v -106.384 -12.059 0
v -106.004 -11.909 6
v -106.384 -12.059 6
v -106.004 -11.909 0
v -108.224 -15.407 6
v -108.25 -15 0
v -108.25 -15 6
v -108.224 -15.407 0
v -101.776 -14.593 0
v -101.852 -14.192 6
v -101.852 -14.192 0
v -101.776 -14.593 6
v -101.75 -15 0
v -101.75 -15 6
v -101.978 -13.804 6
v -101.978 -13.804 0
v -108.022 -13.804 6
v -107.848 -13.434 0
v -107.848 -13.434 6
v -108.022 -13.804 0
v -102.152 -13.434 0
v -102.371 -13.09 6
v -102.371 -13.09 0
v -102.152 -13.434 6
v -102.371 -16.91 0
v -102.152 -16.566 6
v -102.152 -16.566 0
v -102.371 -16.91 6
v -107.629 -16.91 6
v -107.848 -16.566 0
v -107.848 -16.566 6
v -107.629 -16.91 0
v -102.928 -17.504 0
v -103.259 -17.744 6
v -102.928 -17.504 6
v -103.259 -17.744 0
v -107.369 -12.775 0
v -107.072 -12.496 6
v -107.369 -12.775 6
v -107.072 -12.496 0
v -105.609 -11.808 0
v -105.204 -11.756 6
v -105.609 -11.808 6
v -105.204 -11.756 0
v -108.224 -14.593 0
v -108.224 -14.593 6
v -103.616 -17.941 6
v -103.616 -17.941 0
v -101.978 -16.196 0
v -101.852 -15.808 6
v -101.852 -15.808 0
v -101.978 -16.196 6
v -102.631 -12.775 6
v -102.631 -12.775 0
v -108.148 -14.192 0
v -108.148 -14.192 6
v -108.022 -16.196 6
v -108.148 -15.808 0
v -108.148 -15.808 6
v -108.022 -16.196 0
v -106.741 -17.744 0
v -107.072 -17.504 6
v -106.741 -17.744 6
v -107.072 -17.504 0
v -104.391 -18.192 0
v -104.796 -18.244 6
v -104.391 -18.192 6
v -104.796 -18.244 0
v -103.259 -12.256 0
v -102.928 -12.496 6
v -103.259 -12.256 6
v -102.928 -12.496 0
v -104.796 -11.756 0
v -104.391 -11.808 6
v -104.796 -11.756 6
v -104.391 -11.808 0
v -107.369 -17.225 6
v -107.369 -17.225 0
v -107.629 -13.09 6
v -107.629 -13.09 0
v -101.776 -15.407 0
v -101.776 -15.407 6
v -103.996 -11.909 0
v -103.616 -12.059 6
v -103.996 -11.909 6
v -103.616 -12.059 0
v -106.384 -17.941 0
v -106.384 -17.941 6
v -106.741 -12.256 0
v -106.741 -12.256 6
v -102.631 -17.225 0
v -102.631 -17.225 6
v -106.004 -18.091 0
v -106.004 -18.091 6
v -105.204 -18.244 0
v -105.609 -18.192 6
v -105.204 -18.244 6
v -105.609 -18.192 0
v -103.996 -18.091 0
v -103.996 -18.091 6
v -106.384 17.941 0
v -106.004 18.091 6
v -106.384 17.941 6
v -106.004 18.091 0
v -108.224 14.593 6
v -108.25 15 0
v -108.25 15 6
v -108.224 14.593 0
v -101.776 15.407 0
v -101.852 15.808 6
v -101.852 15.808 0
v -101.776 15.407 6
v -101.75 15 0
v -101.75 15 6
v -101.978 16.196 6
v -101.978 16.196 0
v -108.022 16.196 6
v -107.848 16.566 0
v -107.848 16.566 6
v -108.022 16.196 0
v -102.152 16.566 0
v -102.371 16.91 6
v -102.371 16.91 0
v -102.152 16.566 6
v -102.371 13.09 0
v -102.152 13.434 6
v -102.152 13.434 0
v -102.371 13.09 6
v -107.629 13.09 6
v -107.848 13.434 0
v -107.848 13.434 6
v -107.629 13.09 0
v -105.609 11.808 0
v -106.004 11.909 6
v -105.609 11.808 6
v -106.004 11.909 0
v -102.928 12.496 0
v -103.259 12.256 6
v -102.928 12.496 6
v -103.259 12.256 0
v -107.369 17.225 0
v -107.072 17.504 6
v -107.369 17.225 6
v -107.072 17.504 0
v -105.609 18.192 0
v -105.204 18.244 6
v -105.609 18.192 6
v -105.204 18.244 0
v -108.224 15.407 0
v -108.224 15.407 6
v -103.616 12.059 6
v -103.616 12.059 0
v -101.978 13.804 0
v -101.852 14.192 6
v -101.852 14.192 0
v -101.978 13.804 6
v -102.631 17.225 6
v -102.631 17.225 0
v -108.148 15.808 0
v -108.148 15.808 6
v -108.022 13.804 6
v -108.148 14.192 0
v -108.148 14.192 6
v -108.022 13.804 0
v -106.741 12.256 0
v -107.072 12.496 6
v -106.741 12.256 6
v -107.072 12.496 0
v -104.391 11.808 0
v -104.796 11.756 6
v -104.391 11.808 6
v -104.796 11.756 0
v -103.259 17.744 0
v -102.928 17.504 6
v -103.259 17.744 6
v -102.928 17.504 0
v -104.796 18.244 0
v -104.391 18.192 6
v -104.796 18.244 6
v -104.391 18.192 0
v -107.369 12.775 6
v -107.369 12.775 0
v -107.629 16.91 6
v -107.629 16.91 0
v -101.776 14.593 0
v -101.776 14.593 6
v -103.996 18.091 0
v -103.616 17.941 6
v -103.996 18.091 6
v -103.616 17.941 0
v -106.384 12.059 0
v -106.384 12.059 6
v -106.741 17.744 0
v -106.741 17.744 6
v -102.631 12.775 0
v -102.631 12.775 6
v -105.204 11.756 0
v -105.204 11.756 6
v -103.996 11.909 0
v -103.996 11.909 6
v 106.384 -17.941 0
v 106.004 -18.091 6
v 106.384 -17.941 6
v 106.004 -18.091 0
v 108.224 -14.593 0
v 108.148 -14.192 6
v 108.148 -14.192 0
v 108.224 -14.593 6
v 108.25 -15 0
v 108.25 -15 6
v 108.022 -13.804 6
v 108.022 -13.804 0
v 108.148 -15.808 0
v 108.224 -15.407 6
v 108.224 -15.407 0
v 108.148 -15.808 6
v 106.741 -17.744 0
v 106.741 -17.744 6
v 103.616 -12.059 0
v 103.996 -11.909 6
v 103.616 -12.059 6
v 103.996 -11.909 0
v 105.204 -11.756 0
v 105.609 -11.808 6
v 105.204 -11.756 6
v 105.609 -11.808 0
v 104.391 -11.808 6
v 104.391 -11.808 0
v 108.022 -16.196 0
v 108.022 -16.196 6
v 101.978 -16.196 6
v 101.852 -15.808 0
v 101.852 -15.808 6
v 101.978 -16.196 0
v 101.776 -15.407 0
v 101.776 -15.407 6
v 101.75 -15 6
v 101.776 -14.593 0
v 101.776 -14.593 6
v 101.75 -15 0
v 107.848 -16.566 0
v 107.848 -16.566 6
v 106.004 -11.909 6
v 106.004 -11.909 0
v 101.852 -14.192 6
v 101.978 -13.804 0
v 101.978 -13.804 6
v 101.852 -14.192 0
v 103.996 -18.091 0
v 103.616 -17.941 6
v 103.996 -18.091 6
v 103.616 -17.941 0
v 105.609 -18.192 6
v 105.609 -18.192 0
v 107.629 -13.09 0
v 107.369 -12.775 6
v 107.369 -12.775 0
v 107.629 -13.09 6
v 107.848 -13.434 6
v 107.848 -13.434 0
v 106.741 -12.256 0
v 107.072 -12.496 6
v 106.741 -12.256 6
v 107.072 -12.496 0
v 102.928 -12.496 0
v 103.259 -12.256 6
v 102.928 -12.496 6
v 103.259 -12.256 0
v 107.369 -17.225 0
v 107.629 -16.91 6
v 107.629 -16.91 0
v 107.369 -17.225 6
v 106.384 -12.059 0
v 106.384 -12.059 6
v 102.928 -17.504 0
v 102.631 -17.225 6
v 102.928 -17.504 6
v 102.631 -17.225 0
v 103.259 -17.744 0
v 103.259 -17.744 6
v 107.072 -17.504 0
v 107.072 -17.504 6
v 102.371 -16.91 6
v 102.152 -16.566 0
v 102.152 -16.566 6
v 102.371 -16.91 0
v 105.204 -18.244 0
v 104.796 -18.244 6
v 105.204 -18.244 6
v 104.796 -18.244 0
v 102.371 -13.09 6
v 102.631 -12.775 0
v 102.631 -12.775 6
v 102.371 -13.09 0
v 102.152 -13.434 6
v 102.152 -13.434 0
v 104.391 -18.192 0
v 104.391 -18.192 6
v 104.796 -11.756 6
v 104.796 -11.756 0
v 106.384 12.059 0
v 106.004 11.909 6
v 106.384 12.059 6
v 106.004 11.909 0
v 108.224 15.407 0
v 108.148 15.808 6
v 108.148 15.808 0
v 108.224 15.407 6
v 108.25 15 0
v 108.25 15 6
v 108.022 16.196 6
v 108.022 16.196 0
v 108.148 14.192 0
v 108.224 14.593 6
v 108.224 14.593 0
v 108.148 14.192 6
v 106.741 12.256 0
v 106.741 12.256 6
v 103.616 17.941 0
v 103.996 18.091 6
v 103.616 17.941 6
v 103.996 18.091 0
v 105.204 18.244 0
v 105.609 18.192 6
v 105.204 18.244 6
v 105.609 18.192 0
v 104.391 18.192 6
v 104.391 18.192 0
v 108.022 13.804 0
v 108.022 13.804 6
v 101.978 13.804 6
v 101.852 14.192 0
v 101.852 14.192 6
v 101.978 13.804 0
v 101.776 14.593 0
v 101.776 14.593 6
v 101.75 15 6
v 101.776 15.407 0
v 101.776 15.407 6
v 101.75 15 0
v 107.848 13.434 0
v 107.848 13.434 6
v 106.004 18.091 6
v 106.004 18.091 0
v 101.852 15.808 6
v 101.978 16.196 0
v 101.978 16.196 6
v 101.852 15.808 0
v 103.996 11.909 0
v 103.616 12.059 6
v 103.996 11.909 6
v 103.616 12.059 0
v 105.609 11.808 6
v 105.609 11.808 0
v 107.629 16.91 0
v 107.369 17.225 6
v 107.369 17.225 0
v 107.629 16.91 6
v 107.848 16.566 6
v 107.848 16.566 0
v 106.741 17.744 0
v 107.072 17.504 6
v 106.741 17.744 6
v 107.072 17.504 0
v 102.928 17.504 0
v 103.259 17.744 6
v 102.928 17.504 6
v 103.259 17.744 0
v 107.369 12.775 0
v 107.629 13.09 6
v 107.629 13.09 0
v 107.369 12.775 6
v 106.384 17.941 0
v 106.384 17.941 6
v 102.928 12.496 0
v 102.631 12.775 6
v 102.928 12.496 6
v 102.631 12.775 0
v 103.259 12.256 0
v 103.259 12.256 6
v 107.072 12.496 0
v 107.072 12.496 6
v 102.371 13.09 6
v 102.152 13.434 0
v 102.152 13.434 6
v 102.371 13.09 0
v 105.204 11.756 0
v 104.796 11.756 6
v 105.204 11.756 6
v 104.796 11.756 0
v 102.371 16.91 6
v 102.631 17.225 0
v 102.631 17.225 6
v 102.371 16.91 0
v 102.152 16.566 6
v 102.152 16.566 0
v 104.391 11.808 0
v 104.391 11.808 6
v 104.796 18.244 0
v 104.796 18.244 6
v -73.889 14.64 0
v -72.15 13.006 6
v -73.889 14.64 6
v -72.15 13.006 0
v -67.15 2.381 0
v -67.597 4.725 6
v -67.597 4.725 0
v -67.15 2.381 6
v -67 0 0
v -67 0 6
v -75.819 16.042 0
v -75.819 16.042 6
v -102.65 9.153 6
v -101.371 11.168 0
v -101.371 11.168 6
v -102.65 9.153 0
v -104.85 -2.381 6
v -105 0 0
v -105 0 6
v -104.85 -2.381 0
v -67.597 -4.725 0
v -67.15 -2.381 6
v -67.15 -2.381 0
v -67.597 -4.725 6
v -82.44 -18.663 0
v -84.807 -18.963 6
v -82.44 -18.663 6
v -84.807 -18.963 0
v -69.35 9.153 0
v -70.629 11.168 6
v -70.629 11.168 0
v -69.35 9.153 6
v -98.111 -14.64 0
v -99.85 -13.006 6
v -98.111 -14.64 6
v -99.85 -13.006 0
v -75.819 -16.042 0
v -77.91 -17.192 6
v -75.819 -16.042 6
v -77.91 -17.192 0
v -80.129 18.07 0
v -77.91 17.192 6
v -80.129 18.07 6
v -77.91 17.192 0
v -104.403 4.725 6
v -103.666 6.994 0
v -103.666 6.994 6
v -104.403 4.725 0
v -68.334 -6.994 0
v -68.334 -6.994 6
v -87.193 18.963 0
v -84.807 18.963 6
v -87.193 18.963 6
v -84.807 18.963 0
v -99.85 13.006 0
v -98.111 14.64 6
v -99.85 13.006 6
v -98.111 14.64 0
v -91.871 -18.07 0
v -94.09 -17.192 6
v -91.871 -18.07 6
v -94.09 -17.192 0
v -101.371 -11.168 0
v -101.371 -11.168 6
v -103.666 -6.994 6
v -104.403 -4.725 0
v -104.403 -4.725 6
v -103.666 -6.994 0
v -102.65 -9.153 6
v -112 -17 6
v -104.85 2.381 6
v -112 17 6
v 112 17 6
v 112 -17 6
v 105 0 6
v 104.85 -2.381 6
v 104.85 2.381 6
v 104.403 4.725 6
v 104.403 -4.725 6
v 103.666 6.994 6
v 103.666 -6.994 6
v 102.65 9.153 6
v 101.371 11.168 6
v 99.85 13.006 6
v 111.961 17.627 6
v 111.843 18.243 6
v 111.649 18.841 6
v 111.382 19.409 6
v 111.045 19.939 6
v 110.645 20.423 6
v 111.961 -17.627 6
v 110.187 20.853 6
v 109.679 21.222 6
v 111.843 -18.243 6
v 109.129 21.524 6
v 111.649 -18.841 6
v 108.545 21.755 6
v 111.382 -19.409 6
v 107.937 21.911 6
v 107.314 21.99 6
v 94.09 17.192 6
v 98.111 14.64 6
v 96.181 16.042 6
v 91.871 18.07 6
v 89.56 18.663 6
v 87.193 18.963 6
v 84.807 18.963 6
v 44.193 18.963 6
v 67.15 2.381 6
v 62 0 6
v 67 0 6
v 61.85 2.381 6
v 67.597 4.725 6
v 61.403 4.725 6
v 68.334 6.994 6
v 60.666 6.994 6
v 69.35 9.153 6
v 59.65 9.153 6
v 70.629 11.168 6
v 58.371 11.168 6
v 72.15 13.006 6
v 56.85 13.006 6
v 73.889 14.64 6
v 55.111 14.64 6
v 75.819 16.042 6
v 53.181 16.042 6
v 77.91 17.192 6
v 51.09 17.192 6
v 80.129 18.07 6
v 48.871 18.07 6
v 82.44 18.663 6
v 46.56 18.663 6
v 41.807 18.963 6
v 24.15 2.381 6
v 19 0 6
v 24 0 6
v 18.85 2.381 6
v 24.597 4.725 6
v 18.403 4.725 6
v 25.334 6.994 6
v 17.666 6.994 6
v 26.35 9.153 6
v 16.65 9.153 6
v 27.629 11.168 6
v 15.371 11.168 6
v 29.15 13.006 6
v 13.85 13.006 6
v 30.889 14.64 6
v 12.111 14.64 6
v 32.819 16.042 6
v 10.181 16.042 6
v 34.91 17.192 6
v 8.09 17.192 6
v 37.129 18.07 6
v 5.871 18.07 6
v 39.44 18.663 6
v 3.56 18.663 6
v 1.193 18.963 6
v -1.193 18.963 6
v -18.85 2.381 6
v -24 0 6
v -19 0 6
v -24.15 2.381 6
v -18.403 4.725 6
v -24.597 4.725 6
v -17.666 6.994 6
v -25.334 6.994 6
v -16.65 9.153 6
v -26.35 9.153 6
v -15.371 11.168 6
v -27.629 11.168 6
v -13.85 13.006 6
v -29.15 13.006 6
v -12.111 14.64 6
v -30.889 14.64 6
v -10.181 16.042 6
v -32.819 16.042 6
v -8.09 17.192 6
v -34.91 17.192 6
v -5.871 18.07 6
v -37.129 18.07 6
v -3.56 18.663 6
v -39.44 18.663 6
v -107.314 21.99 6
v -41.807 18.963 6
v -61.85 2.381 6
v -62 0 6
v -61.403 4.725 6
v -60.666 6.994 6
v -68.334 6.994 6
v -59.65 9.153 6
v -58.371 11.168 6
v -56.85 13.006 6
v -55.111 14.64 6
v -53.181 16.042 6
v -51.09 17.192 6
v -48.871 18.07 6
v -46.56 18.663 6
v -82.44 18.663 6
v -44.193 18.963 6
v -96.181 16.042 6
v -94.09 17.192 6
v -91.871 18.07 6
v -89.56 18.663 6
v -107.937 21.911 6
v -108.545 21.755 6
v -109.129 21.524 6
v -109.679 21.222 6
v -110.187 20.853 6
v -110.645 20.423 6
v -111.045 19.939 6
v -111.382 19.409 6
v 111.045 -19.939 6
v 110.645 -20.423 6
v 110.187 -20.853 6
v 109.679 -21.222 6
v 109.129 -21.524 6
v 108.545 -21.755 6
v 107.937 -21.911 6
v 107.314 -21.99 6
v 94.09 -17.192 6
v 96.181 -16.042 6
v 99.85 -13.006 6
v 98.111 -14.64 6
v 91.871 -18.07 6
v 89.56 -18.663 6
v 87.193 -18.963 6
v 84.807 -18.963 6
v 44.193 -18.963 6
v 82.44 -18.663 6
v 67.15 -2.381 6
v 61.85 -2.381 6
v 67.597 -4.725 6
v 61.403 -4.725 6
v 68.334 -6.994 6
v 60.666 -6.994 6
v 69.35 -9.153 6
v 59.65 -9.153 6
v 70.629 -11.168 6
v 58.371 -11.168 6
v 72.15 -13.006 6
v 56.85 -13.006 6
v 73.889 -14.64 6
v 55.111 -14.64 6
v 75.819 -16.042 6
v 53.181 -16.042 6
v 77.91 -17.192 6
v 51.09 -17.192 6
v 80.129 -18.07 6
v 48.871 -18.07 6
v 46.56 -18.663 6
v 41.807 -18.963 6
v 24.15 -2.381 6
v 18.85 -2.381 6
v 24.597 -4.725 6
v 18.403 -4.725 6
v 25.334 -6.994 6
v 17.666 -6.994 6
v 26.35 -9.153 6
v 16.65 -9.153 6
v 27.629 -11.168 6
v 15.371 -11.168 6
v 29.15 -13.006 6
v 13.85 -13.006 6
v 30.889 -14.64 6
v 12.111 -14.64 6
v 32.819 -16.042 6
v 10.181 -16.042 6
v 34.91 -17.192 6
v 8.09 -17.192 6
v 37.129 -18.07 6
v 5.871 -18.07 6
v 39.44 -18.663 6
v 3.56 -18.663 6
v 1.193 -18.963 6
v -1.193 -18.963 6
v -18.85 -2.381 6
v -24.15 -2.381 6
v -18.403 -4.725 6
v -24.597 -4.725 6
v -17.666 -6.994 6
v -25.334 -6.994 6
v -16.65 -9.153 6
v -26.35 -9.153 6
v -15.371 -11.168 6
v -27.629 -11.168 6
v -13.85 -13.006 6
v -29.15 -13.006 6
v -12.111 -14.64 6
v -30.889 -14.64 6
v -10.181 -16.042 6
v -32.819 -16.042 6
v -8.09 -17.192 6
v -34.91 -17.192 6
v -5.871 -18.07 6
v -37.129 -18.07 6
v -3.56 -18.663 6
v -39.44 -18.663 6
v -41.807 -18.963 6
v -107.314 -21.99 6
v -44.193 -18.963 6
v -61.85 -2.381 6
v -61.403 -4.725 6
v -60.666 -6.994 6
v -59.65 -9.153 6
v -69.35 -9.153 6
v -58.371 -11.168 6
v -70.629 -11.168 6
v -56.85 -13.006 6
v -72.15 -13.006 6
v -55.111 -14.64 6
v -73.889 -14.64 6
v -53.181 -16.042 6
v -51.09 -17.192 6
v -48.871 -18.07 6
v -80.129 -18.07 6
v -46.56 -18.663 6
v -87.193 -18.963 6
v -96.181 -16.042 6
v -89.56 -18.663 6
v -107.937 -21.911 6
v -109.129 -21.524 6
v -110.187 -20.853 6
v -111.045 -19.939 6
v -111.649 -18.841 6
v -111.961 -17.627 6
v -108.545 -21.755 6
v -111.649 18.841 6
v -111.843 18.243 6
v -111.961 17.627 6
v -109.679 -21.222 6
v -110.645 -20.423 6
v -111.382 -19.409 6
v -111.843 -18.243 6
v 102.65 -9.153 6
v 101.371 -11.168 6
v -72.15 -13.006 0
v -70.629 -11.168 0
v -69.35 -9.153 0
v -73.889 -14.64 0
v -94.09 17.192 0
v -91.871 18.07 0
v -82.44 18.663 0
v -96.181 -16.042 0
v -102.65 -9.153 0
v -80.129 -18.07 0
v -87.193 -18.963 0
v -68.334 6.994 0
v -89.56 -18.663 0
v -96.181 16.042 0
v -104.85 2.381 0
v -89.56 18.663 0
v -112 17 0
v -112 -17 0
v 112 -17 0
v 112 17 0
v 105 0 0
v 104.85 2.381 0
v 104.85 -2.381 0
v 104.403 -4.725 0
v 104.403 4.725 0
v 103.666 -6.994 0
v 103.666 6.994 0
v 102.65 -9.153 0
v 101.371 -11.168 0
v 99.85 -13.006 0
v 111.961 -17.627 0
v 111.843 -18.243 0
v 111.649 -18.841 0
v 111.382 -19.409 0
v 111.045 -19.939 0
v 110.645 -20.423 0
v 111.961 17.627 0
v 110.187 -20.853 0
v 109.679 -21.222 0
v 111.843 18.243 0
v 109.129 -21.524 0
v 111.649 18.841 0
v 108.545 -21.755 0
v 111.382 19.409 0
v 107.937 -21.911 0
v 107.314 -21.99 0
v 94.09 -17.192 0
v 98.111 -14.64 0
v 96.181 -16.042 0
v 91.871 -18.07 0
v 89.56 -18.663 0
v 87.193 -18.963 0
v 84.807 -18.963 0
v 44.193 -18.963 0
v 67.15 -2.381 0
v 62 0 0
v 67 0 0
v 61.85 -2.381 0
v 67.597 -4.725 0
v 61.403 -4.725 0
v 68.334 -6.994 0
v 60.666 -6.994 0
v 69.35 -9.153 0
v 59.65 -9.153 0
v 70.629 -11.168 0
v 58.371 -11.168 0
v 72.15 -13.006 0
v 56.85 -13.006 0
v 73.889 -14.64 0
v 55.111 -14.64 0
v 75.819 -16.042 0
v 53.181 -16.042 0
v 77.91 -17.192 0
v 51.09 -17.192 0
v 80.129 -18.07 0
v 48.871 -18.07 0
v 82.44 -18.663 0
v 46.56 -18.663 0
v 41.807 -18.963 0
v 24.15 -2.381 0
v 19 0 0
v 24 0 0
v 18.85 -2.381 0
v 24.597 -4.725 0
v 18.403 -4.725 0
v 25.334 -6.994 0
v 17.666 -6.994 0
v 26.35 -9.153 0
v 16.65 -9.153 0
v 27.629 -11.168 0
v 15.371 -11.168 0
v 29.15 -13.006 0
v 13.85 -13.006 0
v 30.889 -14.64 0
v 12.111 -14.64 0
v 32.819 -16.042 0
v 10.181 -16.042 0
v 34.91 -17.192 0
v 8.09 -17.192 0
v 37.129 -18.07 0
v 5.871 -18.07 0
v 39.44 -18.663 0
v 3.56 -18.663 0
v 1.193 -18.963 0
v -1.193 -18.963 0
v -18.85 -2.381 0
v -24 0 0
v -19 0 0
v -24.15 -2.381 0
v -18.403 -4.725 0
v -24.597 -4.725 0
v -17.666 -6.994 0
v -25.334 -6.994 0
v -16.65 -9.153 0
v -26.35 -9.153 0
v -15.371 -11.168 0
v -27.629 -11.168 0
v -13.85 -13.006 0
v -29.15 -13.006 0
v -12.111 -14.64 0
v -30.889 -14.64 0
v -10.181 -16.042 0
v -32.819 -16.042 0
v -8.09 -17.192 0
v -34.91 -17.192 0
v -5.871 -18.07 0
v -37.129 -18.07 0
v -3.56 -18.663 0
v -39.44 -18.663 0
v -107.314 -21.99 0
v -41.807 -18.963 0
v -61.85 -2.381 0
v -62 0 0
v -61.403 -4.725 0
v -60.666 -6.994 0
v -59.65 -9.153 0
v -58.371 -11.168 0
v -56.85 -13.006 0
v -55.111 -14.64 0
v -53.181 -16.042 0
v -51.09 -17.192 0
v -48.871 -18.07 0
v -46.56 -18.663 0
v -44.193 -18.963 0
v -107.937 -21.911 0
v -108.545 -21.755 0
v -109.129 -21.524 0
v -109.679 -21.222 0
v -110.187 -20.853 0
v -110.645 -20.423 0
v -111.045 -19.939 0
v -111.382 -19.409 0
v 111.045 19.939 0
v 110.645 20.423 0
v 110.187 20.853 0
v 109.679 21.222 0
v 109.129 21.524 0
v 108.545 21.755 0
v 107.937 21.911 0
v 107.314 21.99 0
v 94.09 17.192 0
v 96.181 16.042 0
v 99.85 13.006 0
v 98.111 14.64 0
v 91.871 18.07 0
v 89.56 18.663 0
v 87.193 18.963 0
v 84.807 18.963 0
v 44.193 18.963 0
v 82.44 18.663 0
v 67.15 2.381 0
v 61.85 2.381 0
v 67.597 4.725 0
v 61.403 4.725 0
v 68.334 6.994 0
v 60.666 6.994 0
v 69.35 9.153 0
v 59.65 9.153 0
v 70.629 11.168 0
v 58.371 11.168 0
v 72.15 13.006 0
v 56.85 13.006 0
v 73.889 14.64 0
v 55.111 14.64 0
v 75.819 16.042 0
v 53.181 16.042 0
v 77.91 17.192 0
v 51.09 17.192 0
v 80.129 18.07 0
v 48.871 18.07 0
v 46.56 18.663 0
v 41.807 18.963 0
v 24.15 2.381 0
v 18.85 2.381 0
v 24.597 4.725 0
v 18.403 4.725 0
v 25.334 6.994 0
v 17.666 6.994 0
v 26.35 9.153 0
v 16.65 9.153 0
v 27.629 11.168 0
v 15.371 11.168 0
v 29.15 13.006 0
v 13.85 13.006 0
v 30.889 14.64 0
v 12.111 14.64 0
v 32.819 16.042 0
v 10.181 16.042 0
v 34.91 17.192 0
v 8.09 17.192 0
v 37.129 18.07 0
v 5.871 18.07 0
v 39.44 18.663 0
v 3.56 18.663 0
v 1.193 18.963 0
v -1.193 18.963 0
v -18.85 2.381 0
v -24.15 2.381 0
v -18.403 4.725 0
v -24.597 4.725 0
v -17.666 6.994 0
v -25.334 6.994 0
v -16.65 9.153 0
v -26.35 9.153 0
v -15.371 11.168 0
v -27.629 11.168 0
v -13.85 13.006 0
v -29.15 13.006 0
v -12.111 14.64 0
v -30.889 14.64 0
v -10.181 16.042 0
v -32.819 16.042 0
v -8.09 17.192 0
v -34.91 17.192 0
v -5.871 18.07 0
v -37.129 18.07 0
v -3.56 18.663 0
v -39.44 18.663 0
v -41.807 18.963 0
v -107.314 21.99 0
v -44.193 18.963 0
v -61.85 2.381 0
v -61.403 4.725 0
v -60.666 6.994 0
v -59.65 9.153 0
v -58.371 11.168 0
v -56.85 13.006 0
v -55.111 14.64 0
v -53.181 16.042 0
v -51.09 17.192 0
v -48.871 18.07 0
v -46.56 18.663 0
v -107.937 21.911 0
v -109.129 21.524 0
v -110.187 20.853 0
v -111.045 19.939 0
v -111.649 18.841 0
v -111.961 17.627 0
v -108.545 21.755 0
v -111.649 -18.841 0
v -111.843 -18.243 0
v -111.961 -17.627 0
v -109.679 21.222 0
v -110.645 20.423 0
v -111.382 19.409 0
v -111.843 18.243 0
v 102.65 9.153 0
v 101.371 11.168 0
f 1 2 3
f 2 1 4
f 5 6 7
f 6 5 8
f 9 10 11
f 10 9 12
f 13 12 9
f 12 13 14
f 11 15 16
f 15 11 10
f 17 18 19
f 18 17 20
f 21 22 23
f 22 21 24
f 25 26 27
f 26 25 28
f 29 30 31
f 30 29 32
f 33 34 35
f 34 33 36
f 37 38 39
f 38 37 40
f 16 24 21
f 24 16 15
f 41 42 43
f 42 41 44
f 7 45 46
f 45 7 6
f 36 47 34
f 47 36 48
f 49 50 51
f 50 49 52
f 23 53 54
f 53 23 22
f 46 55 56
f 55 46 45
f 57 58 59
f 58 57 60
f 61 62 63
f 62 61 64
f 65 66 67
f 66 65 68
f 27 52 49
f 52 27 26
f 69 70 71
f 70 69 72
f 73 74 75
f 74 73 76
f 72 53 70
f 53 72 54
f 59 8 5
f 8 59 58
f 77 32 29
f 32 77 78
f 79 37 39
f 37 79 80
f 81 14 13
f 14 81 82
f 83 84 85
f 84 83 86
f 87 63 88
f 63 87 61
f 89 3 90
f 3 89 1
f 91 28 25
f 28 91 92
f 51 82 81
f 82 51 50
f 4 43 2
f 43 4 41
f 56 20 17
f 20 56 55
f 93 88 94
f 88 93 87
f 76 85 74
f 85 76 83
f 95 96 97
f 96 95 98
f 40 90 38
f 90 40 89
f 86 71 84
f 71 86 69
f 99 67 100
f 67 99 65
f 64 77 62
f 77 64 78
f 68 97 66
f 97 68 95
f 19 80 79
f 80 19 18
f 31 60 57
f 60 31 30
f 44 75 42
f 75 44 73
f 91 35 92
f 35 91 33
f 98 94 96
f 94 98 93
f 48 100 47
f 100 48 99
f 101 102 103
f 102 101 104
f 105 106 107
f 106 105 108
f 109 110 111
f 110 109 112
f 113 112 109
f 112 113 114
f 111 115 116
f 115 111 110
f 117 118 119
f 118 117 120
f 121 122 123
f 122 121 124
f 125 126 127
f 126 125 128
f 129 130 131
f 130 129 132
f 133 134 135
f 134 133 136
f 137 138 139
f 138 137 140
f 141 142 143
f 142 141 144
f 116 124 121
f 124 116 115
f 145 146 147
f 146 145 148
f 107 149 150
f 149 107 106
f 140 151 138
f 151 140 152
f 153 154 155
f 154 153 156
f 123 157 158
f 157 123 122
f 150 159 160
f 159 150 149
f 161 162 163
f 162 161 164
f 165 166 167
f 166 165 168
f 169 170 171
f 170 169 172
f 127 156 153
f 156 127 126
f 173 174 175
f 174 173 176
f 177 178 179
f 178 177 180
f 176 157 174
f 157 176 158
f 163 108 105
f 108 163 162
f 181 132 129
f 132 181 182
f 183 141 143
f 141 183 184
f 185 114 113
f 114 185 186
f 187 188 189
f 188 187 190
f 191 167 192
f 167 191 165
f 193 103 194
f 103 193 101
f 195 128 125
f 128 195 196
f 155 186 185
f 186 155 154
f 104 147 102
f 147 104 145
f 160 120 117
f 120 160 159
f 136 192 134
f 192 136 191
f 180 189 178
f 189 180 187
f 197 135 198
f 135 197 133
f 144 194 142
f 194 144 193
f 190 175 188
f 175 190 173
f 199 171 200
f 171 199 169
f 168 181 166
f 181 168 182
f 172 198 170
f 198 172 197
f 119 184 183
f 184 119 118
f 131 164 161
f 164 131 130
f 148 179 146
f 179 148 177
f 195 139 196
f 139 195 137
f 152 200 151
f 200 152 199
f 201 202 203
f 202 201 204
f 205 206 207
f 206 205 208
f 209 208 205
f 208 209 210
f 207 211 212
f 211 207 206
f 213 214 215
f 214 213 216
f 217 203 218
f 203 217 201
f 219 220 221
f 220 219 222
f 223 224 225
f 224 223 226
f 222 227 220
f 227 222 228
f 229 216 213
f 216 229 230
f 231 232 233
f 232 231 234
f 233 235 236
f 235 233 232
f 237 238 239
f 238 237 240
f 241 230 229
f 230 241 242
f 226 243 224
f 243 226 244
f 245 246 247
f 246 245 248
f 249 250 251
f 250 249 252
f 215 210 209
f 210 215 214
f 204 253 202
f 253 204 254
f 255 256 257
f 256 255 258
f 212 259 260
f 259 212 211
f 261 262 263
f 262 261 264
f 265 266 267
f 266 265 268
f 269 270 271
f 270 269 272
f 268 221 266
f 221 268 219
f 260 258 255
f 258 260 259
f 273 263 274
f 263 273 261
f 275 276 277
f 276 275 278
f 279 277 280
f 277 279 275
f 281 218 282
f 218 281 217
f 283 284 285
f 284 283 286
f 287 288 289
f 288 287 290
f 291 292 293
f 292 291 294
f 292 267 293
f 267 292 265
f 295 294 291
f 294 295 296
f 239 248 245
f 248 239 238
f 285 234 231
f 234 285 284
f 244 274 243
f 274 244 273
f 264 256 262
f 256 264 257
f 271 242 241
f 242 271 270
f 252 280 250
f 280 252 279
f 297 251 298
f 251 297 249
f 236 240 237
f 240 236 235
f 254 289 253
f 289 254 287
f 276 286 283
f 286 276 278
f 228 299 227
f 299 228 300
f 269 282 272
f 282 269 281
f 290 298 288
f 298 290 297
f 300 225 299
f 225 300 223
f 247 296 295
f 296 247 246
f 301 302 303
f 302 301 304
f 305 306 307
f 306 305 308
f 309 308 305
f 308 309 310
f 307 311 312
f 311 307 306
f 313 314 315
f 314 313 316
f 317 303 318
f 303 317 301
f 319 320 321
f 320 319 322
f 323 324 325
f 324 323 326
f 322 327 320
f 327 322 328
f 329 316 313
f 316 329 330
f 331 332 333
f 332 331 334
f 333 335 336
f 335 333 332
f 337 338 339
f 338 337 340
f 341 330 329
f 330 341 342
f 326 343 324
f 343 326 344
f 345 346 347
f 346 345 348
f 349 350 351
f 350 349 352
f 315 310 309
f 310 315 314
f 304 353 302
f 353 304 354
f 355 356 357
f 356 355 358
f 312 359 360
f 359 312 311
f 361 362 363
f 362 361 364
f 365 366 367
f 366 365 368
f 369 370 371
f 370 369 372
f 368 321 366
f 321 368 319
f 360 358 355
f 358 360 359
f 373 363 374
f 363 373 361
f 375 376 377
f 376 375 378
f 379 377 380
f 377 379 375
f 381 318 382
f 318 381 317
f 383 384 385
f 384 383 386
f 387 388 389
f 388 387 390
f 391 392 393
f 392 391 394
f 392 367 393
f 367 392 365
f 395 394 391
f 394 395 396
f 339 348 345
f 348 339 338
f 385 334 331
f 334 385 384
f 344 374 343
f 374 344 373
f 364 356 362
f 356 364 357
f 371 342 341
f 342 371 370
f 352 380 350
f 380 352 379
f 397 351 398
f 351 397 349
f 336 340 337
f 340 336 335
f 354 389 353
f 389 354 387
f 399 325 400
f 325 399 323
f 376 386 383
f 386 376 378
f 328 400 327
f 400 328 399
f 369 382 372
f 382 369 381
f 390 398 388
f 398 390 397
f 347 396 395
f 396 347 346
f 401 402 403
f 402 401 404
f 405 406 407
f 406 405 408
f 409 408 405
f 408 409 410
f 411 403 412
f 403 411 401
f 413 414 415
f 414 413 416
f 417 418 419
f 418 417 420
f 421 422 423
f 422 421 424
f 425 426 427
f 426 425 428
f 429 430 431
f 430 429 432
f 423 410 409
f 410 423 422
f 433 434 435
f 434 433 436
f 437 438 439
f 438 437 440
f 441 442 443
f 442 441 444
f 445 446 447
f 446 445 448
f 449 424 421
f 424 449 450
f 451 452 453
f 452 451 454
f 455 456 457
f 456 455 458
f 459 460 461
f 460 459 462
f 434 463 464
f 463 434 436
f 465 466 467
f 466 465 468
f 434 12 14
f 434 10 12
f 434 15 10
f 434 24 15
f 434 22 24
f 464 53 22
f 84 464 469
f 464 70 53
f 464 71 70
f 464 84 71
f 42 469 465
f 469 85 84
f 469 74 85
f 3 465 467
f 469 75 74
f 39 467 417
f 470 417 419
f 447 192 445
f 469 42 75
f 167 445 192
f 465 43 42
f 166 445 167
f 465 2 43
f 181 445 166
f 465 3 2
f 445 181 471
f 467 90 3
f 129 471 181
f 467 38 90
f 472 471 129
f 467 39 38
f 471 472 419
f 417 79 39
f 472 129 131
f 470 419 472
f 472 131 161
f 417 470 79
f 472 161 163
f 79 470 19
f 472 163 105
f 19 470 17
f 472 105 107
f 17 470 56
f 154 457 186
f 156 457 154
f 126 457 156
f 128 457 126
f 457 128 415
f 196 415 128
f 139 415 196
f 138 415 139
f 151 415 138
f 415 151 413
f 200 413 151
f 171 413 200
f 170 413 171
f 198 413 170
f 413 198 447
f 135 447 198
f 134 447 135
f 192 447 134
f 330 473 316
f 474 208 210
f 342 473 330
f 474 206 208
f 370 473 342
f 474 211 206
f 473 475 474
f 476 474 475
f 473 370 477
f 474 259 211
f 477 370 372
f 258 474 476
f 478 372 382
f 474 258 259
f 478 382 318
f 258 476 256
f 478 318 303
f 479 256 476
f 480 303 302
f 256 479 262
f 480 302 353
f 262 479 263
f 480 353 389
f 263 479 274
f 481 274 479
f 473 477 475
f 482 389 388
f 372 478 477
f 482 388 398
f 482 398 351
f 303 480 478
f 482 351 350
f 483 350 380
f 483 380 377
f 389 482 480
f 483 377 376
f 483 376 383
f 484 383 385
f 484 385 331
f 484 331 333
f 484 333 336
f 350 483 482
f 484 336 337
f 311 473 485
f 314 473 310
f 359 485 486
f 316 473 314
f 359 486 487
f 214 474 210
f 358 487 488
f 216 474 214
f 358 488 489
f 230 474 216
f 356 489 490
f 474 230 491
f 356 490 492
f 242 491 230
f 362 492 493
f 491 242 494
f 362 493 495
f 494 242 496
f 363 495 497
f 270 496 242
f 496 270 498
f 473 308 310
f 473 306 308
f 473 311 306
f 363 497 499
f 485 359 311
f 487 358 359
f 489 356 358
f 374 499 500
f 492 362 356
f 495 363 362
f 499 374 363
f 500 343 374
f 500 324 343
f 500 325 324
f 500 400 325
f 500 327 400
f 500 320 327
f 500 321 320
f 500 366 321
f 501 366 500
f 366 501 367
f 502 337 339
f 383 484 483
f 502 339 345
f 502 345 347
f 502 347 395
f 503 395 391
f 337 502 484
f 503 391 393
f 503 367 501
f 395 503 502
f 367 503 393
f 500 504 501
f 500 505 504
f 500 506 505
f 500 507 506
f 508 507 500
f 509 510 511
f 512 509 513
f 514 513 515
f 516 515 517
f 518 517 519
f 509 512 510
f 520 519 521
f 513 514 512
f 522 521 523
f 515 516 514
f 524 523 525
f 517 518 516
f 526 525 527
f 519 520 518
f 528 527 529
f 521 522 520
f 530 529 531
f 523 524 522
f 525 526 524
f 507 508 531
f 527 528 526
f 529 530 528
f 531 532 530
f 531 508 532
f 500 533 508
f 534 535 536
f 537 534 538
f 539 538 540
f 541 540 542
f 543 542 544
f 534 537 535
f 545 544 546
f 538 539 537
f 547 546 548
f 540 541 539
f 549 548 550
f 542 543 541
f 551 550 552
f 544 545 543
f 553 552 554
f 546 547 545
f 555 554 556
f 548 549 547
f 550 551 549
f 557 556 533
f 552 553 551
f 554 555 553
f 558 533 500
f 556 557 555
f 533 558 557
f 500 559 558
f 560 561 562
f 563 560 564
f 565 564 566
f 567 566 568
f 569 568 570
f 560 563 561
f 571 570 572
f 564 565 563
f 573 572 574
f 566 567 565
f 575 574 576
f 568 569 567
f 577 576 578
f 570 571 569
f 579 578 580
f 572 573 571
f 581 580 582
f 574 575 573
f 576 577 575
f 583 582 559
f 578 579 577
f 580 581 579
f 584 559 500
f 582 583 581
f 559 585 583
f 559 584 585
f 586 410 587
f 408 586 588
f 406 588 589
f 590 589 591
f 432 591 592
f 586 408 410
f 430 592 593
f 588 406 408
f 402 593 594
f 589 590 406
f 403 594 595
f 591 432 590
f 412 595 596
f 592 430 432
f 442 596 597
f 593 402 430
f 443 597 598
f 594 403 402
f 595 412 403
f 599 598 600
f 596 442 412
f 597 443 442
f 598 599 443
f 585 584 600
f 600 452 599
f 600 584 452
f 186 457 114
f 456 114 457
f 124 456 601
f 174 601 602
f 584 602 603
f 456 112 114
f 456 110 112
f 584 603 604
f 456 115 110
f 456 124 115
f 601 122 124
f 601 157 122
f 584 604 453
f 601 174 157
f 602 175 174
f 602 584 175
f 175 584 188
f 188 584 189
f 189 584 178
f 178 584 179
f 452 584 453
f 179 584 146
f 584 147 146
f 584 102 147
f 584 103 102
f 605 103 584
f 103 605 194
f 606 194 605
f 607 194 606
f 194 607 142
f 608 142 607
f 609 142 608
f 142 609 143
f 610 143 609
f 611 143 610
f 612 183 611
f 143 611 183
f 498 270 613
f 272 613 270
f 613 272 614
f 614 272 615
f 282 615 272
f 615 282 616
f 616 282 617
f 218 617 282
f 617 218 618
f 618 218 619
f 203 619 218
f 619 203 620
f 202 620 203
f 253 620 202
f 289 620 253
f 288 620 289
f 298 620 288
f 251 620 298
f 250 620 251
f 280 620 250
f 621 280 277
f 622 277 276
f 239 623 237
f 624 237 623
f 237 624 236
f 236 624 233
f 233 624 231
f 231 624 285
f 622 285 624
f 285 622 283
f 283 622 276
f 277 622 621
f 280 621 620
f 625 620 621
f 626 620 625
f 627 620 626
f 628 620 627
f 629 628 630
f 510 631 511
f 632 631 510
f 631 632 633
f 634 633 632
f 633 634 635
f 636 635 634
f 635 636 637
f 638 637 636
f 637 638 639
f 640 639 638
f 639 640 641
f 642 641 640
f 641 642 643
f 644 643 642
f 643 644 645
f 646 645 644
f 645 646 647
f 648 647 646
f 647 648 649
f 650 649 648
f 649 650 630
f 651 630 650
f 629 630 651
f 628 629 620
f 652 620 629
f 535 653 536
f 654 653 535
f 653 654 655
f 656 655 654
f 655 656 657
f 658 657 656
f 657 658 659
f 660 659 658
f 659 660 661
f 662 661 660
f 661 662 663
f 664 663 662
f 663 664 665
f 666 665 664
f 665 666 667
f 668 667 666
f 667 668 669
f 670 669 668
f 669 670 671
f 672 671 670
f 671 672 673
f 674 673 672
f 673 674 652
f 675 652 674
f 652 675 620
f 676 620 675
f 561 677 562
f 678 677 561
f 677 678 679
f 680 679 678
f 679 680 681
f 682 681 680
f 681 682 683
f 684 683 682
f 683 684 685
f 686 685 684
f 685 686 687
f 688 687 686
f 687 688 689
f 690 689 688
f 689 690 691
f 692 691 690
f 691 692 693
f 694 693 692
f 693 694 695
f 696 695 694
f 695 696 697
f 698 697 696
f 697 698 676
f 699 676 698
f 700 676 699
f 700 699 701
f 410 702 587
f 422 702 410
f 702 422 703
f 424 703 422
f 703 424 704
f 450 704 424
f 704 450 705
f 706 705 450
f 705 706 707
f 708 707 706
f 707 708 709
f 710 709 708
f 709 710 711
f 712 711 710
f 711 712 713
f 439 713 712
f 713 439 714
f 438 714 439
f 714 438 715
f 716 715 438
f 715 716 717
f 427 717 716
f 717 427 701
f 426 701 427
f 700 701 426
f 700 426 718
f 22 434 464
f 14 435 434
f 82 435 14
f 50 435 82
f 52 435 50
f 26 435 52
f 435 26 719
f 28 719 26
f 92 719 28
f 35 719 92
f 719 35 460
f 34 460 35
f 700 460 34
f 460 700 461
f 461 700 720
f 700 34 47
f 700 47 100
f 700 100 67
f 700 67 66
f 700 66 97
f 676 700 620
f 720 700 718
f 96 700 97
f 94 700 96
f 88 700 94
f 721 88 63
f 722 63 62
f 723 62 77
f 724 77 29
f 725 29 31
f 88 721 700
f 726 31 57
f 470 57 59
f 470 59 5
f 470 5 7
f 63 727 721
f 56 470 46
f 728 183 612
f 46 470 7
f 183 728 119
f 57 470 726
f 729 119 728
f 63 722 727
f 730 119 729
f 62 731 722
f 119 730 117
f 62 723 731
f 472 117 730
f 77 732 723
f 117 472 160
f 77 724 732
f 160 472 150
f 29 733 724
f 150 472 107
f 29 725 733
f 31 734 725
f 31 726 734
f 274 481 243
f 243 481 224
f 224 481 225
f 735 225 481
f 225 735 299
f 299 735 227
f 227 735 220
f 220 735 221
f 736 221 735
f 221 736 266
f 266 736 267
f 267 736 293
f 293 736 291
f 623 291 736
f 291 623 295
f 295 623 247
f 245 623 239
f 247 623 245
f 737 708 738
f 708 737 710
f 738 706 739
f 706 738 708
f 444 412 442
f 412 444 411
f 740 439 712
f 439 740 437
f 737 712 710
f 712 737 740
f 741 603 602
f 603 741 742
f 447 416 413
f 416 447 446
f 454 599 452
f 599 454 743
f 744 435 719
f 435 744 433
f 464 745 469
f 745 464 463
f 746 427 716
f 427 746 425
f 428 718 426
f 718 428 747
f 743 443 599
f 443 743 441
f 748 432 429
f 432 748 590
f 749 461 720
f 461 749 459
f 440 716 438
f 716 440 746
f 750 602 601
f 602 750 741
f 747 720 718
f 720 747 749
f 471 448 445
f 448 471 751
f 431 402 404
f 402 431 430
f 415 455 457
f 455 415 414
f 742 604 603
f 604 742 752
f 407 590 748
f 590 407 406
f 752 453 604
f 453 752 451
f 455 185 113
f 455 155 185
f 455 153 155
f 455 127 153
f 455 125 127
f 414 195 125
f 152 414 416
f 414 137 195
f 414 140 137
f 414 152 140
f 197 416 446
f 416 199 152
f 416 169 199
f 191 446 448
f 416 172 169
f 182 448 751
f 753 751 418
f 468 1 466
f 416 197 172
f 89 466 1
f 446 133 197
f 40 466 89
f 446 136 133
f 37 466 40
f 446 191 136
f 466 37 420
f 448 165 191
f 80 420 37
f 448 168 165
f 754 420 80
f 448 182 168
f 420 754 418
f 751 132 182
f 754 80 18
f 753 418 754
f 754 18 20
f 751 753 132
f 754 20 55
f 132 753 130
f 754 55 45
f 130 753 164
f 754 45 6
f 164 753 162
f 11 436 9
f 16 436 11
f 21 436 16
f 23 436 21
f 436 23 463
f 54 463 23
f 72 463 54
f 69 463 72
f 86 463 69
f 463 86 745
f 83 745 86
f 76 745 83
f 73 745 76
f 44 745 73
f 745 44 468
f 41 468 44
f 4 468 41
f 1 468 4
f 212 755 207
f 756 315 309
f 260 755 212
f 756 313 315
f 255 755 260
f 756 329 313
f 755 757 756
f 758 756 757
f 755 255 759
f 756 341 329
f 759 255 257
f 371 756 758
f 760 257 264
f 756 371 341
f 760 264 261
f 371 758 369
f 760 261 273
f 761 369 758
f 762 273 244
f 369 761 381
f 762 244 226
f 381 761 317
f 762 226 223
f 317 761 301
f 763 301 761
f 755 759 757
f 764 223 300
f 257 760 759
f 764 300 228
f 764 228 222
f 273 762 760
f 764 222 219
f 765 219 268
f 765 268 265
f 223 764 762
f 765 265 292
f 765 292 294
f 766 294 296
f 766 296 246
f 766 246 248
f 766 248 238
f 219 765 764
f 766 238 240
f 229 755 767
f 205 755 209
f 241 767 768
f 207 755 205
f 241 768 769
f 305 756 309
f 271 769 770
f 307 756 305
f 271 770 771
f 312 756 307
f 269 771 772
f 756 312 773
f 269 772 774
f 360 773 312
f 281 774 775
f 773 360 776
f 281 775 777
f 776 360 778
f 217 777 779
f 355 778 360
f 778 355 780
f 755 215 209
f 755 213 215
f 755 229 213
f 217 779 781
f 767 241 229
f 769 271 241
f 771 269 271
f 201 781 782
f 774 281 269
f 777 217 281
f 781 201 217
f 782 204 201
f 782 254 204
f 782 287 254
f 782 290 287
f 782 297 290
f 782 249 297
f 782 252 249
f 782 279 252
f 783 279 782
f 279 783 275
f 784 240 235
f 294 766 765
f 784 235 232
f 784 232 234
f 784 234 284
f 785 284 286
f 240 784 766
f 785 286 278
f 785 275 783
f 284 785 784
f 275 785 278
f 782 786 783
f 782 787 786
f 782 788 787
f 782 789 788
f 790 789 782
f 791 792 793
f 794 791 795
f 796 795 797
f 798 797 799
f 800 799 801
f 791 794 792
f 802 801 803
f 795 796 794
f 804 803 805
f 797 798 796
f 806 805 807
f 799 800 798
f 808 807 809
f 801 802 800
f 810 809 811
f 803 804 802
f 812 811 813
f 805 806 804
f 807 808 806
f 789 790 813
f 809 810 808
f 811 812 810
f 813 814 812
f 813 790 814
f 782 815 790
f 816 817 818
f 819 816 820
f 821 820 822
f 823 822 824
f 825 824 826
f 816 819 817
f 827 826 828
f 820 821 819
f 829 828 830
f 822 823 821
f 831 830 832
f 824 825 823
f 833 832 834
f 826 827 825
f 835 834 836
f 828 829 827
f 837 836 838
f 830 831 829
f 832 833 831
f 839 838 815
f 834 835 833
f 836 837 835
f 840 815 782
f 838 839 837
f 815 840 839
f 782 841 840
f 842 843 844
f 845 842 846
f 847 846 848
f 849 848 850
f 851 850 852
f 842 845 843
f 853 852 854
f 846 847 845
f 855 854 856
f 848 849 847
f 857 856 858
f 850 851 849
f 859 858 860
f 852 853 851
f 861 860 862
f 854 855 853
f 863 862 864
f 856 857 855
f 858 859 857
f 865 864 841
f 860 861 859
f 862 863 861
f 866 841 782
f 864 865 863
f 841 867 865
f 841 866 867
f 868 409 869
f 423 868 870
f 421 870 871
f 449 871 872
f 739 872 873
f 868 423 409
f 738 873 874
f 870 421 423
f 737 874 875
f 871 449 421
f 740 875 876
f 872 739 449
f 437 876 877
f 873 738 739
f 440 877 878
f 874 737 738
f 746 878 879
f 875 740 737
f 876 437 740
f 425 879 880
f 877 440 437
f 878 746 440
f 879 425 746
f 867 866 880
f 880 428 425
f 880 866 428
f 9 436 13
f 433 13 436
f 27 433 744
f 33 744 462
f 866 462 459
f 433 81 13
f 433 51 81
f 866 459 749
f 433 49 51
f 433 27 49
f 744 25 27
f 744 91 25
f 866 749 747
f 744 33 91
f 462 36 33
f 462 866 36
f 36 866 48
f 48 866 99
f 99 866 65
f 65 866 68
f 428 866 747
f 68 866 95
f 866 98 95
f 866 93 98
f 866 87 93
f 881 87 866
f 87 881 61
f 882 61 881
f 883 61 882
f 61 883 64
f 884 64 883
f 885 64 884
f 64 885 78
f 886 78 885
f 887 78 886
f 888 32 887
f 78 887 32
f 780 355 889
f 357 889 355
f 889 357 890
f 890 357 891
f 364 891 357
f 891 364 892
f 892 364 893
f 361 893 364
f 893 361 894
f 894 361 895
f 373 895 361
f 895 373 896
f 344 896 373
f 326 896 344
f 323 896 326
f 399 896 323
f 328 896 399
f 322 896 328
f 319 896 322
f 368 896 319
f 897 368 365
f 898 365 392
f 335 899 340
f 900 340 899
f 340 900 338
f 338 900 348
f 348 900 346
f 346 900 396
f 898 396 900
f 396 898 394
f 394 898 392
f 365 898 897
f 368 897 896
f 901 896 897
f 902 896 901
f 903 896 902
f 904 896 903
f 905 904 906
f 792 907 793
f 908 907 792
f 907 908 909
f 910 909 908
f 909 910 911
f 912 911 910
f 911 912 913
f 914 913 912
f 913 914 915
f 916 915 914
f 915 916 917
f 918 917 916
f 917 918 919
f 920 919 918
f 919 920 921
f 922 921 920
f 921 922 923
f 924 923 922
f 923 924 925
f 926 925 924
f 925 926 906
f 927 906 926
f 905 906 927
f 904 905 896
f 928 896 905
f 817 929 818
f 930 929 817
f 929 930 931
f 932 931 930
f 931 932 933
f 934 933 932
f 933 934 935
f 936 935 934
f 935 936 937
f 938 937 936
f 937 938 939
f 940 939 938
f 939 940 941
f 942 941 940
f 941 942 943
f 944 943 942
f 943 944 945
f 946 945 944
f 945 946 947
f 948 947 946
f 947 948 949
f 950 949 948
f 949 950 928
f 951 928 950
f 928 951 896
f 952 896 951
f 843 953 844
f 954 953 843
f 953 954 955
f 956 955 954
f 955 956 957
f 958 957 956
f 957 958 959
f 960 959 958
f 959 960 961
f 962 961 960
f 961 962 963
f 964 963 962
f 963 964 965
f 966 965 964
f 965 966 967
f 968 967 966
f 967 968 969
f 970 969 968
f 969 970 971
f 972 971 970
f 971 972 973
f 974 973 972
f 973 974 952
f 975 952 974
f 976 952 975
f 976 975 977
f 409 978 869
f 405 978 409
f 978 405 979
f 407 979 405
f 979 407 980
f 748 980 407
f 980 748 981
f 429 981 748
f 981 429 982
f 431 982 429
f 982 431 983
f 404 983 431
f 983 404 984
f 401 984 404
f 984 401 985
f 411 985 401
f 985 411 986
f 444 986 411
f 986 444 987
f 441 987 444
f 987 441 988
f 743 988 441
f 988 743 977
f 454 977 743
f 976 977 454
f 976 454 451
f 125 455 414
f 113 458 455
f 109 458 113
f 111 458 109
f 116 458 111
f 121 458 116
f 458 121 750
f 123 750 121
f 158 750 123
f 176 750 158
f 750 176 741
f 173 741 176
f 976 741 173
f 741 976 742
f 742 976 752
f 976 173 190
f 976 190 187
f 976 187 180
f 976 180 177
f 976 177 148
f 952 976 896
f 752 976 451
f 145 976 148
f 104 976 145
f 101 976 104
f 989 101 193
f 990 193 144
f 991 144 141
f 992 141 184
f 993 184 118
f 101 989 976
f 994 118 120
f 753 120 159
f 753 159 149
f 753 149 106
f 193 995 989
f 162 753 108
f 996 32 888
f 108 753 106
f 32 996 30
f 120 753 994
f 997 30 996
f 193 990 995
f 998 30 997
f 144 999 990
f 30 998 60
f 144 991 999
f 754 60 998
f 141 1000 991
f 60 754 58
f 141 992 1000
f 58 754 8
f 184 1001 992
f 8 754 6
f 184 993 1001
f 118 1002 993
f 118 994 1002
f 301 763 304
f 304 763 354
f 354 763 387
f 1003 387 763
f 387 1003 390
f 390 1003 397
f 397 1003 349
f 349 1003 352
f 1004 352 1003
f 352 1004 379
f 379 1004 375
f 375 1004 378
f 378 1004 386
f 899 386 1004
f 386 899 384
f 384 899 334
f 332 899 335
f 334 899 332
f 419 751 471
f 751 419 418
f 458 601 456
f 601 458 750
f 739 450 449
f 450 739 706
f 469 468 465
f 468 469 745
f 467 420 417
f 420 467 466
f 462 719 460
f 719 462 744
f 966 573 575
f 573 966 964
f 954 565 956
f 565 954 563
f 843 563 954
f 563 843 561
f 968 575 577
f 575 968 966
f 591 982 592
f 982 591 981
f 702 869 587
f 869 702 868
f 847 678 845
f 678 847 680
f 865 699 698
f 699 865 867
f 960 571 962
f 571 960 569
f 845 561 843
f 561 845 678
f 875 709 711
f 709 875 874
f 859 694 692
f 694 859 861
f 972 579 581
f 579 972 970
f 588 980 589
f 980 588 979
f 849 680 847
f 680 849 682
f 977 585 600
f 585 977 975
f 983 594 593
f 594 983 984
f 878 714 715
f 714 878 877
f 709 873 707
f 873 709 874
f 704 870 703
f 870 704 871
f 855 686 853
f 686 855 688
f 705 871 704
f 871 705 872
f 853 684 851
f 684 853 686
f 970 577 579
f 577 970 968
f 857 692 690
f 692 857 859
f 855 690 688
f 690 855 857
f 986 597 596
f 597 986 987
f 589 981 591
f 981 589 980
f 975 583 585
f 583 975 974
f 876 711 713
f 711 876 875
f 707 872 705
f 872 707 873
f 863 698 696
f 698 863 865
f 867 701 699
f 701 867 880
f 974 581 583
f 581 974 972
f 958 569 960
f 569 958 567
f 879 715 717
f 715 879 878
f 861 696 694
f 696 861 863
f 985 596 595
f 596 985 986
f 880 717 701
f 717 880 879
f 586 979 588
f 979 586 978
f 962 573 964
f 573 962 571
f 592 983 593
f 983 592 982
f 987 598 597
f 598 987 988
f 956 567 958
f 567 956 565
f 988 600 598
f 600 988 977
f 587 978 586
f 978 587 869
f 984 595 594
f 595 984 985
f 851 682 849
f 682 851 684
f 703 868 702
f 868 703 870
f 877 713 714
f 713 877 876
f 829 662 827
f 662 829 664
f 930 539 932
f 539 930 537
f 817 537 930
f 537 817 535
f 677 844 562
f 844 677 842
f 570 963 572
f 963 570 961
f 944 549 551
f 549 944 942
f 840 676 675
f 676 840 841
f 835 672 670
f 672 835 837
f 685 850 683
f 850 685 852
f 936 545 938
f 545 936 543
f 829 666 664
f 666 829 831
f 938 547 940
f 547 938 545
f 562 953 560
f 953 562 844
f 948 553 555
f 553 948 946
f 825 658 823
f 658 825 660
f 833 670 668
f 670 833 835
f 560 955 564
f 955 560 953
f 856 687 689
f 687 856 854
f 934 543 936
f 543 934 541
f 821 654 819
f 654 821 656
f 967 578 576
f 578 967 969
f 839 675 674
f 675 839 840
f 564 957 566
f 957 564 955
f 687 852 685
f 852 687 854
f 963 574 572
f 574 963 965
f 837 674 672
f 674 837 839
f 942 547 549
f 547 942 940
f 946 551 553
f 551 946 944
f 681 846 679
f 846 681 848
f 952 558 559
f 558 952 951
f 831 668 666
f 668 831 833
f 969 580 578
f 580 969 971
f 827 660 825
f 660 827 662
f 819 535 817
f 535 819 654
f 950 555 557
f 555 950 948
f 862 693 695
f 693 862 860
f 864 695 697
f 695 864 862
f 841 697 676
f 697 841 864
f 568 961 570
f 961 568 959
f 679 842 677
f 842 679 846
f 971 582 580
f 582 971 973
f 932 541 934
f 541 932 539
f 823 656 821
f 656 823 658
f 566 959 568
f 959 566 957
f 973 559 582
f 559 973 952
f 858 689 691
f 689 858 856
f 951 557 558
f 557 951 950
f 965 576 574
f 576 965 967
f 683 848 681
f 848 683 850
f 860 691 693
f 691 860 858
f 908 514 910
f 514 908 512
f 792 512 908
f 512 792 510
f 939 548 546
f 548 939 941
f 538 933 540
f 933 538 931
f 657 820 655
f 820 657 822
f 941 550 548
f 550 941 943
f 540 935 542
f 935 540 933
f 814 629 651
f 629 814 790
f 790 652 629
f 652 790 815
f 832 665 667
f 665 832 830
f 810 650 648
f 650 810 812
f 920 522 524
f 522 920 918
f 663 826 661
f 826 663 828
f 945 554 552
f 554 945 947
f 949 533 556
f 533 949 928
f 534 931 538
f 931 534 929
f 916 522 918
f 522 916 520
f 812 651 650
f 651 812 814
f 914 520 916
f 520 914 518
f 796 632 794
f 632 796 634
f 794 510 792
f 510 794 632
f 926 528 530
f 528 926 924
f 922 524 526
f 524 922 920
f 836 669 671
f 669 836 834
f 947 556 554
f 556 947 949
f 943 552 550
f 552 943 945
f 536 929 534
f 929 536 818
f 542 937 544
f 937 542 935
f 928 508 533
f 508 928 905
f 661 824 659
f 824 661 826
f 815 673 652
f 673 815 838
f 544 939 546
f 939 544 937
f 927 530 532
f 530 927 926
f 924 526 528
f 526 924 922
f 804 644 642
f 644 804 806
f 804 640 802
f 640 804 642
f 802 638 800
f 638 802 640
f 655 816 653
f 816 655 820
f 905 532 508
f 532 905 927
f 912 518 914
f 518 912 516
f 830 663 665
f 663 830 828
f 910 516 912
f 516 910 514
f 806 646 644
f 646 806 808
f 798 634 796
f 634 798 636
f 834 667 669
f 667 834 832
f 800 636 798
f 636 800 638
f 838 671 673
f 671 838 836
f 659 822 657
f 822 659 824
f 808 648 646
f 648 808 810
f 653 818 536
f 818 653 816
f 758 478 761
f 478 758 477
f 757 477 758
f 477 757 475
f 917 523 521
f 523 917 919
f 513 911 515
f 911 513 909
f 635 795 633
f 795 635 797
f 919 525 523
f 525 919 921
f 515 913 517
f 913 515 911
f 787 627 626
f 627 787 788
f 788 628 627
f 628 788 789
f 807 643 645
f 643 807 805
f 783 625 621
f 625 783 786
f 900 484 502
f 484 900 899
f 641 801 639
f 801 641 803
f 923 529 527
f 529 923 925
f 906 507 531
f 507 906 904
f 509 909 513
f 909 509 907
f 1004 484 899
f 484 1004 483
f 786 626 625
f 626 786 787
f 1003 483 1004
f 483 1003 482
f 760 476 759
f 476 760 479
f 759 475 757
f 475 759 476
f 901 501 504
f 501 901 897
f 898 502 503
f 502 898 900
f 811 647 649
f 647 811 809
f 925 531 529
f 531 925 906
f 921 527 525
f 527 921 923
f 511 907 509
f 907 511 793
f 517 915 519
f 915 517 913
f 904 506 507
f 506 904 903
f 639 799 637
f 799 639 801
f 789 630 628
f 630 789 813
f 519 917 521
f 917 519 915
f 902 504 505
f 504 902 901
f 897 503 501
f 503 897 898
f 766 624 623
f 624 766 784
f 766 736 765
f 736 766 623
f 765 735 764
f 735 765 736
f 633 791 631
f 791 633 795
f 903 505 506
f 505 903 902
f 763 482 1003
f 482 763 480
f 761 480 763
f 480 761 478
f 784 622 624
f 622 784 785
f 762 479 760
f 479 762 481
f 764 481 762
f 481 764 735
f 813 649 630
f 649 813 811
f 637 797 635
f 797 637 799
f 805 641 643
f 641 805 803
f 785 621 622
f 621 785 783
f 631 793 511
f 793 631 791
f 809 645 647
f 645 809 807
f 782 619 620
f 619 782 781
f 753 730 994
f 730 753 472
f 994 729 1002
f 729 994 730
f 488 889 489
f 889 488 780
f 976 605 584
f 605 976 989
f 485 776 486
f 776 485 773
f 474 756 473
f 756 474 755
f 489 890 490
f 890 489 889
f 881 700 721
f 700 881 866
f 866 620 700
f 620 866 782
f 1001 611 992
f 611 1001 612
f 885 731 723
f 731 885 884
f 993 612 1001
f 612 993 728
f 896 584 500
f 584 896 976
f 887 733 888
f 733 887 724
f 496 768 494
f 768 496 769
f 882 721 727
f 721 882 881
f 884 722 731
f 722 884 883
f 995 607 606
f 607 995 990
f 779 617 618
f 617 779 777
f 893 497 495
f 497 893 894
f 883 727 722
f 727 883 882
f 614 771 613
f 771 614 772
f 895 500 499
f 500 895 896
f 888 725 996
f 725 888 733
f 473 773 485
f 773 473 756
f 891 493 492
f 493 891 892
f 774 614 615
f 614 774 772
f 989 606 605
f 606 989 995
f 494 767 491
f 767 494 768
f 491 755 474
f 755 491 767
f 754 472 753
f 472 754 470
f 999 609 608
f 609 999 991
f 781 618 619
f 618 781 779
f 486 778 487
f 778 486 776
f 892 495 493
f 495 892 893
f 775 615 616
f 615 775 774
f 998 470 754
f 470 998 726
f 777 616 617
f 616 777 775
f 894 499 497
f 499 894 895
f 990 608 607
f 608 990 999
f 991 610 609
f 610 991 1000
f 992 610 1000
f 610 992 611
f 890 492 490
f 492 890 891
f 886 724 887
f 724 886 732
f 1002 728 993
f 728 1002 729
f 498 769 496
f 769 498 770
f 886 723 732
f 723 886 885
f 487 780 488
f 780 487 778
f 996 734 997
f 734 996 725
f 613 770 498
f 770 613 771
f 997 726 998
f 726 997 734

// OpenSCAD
$fn = 50;


difference() {
	union() {
		hull() {
			translate(v = [-107.0000000000, 17.0000000000, 0]) {
				cylinder(h = 6, r = 5);
			}
			translate(v = [107.0000000000, 17.0000000000, 0]) {
				cylinder(h = 6, r = 5);
			}
			translate(v = [-107.0000000000, -17.0000000000, 0]) {
				cylinder(h = 6, r = 5);
			}
			translate(v = [107.0000000000, -17.0000000000, 0]) {
				cylinder(h = 6, r = 5);
			}
		}
	}
	union() {
		#translate(v = [-105.0000000000, -15.0000000000, -100.0000000000]) {
			cylinder(h = 200, r = 3.2500000000);
		}
		#translate(v = [-105.0000000000, 15.0000000000, -100.0000000000]) {
			cylinder(h = 200, r = 3.2500000000);
		}
		#translate(v = [105.0000000000, -15.0000000000, -100.0000000000]) {
			cylinder(h = 200, r = 3.2500000000);
		}
		#translate(v = [105.0000000000, 15.0000000000, -100.0000000000]) {
			cylinder(h = 200, r = 3.2500000000);
		}
		#translate(v = [-86.0000000000, 0, 0]) {
			cylinder(h = 6, r = 19.0000000000);
		}
		#translate(v = [-43.0000000000, 0, 0]) {
			cylinder(h = 6, r = 19.0000000000);
		}
		#cylinder(h = 6, r = 19.0000000000);
		#translate(v = [43.0000000000, 0, 0]) {
			cylinder(h = 6, r = 19.0000000000);
		}
		#translate(v = [86.0000000000, 0, 0]) {
			cylinder(h = 6, r = 19.0000000000);
		}
	}
}
